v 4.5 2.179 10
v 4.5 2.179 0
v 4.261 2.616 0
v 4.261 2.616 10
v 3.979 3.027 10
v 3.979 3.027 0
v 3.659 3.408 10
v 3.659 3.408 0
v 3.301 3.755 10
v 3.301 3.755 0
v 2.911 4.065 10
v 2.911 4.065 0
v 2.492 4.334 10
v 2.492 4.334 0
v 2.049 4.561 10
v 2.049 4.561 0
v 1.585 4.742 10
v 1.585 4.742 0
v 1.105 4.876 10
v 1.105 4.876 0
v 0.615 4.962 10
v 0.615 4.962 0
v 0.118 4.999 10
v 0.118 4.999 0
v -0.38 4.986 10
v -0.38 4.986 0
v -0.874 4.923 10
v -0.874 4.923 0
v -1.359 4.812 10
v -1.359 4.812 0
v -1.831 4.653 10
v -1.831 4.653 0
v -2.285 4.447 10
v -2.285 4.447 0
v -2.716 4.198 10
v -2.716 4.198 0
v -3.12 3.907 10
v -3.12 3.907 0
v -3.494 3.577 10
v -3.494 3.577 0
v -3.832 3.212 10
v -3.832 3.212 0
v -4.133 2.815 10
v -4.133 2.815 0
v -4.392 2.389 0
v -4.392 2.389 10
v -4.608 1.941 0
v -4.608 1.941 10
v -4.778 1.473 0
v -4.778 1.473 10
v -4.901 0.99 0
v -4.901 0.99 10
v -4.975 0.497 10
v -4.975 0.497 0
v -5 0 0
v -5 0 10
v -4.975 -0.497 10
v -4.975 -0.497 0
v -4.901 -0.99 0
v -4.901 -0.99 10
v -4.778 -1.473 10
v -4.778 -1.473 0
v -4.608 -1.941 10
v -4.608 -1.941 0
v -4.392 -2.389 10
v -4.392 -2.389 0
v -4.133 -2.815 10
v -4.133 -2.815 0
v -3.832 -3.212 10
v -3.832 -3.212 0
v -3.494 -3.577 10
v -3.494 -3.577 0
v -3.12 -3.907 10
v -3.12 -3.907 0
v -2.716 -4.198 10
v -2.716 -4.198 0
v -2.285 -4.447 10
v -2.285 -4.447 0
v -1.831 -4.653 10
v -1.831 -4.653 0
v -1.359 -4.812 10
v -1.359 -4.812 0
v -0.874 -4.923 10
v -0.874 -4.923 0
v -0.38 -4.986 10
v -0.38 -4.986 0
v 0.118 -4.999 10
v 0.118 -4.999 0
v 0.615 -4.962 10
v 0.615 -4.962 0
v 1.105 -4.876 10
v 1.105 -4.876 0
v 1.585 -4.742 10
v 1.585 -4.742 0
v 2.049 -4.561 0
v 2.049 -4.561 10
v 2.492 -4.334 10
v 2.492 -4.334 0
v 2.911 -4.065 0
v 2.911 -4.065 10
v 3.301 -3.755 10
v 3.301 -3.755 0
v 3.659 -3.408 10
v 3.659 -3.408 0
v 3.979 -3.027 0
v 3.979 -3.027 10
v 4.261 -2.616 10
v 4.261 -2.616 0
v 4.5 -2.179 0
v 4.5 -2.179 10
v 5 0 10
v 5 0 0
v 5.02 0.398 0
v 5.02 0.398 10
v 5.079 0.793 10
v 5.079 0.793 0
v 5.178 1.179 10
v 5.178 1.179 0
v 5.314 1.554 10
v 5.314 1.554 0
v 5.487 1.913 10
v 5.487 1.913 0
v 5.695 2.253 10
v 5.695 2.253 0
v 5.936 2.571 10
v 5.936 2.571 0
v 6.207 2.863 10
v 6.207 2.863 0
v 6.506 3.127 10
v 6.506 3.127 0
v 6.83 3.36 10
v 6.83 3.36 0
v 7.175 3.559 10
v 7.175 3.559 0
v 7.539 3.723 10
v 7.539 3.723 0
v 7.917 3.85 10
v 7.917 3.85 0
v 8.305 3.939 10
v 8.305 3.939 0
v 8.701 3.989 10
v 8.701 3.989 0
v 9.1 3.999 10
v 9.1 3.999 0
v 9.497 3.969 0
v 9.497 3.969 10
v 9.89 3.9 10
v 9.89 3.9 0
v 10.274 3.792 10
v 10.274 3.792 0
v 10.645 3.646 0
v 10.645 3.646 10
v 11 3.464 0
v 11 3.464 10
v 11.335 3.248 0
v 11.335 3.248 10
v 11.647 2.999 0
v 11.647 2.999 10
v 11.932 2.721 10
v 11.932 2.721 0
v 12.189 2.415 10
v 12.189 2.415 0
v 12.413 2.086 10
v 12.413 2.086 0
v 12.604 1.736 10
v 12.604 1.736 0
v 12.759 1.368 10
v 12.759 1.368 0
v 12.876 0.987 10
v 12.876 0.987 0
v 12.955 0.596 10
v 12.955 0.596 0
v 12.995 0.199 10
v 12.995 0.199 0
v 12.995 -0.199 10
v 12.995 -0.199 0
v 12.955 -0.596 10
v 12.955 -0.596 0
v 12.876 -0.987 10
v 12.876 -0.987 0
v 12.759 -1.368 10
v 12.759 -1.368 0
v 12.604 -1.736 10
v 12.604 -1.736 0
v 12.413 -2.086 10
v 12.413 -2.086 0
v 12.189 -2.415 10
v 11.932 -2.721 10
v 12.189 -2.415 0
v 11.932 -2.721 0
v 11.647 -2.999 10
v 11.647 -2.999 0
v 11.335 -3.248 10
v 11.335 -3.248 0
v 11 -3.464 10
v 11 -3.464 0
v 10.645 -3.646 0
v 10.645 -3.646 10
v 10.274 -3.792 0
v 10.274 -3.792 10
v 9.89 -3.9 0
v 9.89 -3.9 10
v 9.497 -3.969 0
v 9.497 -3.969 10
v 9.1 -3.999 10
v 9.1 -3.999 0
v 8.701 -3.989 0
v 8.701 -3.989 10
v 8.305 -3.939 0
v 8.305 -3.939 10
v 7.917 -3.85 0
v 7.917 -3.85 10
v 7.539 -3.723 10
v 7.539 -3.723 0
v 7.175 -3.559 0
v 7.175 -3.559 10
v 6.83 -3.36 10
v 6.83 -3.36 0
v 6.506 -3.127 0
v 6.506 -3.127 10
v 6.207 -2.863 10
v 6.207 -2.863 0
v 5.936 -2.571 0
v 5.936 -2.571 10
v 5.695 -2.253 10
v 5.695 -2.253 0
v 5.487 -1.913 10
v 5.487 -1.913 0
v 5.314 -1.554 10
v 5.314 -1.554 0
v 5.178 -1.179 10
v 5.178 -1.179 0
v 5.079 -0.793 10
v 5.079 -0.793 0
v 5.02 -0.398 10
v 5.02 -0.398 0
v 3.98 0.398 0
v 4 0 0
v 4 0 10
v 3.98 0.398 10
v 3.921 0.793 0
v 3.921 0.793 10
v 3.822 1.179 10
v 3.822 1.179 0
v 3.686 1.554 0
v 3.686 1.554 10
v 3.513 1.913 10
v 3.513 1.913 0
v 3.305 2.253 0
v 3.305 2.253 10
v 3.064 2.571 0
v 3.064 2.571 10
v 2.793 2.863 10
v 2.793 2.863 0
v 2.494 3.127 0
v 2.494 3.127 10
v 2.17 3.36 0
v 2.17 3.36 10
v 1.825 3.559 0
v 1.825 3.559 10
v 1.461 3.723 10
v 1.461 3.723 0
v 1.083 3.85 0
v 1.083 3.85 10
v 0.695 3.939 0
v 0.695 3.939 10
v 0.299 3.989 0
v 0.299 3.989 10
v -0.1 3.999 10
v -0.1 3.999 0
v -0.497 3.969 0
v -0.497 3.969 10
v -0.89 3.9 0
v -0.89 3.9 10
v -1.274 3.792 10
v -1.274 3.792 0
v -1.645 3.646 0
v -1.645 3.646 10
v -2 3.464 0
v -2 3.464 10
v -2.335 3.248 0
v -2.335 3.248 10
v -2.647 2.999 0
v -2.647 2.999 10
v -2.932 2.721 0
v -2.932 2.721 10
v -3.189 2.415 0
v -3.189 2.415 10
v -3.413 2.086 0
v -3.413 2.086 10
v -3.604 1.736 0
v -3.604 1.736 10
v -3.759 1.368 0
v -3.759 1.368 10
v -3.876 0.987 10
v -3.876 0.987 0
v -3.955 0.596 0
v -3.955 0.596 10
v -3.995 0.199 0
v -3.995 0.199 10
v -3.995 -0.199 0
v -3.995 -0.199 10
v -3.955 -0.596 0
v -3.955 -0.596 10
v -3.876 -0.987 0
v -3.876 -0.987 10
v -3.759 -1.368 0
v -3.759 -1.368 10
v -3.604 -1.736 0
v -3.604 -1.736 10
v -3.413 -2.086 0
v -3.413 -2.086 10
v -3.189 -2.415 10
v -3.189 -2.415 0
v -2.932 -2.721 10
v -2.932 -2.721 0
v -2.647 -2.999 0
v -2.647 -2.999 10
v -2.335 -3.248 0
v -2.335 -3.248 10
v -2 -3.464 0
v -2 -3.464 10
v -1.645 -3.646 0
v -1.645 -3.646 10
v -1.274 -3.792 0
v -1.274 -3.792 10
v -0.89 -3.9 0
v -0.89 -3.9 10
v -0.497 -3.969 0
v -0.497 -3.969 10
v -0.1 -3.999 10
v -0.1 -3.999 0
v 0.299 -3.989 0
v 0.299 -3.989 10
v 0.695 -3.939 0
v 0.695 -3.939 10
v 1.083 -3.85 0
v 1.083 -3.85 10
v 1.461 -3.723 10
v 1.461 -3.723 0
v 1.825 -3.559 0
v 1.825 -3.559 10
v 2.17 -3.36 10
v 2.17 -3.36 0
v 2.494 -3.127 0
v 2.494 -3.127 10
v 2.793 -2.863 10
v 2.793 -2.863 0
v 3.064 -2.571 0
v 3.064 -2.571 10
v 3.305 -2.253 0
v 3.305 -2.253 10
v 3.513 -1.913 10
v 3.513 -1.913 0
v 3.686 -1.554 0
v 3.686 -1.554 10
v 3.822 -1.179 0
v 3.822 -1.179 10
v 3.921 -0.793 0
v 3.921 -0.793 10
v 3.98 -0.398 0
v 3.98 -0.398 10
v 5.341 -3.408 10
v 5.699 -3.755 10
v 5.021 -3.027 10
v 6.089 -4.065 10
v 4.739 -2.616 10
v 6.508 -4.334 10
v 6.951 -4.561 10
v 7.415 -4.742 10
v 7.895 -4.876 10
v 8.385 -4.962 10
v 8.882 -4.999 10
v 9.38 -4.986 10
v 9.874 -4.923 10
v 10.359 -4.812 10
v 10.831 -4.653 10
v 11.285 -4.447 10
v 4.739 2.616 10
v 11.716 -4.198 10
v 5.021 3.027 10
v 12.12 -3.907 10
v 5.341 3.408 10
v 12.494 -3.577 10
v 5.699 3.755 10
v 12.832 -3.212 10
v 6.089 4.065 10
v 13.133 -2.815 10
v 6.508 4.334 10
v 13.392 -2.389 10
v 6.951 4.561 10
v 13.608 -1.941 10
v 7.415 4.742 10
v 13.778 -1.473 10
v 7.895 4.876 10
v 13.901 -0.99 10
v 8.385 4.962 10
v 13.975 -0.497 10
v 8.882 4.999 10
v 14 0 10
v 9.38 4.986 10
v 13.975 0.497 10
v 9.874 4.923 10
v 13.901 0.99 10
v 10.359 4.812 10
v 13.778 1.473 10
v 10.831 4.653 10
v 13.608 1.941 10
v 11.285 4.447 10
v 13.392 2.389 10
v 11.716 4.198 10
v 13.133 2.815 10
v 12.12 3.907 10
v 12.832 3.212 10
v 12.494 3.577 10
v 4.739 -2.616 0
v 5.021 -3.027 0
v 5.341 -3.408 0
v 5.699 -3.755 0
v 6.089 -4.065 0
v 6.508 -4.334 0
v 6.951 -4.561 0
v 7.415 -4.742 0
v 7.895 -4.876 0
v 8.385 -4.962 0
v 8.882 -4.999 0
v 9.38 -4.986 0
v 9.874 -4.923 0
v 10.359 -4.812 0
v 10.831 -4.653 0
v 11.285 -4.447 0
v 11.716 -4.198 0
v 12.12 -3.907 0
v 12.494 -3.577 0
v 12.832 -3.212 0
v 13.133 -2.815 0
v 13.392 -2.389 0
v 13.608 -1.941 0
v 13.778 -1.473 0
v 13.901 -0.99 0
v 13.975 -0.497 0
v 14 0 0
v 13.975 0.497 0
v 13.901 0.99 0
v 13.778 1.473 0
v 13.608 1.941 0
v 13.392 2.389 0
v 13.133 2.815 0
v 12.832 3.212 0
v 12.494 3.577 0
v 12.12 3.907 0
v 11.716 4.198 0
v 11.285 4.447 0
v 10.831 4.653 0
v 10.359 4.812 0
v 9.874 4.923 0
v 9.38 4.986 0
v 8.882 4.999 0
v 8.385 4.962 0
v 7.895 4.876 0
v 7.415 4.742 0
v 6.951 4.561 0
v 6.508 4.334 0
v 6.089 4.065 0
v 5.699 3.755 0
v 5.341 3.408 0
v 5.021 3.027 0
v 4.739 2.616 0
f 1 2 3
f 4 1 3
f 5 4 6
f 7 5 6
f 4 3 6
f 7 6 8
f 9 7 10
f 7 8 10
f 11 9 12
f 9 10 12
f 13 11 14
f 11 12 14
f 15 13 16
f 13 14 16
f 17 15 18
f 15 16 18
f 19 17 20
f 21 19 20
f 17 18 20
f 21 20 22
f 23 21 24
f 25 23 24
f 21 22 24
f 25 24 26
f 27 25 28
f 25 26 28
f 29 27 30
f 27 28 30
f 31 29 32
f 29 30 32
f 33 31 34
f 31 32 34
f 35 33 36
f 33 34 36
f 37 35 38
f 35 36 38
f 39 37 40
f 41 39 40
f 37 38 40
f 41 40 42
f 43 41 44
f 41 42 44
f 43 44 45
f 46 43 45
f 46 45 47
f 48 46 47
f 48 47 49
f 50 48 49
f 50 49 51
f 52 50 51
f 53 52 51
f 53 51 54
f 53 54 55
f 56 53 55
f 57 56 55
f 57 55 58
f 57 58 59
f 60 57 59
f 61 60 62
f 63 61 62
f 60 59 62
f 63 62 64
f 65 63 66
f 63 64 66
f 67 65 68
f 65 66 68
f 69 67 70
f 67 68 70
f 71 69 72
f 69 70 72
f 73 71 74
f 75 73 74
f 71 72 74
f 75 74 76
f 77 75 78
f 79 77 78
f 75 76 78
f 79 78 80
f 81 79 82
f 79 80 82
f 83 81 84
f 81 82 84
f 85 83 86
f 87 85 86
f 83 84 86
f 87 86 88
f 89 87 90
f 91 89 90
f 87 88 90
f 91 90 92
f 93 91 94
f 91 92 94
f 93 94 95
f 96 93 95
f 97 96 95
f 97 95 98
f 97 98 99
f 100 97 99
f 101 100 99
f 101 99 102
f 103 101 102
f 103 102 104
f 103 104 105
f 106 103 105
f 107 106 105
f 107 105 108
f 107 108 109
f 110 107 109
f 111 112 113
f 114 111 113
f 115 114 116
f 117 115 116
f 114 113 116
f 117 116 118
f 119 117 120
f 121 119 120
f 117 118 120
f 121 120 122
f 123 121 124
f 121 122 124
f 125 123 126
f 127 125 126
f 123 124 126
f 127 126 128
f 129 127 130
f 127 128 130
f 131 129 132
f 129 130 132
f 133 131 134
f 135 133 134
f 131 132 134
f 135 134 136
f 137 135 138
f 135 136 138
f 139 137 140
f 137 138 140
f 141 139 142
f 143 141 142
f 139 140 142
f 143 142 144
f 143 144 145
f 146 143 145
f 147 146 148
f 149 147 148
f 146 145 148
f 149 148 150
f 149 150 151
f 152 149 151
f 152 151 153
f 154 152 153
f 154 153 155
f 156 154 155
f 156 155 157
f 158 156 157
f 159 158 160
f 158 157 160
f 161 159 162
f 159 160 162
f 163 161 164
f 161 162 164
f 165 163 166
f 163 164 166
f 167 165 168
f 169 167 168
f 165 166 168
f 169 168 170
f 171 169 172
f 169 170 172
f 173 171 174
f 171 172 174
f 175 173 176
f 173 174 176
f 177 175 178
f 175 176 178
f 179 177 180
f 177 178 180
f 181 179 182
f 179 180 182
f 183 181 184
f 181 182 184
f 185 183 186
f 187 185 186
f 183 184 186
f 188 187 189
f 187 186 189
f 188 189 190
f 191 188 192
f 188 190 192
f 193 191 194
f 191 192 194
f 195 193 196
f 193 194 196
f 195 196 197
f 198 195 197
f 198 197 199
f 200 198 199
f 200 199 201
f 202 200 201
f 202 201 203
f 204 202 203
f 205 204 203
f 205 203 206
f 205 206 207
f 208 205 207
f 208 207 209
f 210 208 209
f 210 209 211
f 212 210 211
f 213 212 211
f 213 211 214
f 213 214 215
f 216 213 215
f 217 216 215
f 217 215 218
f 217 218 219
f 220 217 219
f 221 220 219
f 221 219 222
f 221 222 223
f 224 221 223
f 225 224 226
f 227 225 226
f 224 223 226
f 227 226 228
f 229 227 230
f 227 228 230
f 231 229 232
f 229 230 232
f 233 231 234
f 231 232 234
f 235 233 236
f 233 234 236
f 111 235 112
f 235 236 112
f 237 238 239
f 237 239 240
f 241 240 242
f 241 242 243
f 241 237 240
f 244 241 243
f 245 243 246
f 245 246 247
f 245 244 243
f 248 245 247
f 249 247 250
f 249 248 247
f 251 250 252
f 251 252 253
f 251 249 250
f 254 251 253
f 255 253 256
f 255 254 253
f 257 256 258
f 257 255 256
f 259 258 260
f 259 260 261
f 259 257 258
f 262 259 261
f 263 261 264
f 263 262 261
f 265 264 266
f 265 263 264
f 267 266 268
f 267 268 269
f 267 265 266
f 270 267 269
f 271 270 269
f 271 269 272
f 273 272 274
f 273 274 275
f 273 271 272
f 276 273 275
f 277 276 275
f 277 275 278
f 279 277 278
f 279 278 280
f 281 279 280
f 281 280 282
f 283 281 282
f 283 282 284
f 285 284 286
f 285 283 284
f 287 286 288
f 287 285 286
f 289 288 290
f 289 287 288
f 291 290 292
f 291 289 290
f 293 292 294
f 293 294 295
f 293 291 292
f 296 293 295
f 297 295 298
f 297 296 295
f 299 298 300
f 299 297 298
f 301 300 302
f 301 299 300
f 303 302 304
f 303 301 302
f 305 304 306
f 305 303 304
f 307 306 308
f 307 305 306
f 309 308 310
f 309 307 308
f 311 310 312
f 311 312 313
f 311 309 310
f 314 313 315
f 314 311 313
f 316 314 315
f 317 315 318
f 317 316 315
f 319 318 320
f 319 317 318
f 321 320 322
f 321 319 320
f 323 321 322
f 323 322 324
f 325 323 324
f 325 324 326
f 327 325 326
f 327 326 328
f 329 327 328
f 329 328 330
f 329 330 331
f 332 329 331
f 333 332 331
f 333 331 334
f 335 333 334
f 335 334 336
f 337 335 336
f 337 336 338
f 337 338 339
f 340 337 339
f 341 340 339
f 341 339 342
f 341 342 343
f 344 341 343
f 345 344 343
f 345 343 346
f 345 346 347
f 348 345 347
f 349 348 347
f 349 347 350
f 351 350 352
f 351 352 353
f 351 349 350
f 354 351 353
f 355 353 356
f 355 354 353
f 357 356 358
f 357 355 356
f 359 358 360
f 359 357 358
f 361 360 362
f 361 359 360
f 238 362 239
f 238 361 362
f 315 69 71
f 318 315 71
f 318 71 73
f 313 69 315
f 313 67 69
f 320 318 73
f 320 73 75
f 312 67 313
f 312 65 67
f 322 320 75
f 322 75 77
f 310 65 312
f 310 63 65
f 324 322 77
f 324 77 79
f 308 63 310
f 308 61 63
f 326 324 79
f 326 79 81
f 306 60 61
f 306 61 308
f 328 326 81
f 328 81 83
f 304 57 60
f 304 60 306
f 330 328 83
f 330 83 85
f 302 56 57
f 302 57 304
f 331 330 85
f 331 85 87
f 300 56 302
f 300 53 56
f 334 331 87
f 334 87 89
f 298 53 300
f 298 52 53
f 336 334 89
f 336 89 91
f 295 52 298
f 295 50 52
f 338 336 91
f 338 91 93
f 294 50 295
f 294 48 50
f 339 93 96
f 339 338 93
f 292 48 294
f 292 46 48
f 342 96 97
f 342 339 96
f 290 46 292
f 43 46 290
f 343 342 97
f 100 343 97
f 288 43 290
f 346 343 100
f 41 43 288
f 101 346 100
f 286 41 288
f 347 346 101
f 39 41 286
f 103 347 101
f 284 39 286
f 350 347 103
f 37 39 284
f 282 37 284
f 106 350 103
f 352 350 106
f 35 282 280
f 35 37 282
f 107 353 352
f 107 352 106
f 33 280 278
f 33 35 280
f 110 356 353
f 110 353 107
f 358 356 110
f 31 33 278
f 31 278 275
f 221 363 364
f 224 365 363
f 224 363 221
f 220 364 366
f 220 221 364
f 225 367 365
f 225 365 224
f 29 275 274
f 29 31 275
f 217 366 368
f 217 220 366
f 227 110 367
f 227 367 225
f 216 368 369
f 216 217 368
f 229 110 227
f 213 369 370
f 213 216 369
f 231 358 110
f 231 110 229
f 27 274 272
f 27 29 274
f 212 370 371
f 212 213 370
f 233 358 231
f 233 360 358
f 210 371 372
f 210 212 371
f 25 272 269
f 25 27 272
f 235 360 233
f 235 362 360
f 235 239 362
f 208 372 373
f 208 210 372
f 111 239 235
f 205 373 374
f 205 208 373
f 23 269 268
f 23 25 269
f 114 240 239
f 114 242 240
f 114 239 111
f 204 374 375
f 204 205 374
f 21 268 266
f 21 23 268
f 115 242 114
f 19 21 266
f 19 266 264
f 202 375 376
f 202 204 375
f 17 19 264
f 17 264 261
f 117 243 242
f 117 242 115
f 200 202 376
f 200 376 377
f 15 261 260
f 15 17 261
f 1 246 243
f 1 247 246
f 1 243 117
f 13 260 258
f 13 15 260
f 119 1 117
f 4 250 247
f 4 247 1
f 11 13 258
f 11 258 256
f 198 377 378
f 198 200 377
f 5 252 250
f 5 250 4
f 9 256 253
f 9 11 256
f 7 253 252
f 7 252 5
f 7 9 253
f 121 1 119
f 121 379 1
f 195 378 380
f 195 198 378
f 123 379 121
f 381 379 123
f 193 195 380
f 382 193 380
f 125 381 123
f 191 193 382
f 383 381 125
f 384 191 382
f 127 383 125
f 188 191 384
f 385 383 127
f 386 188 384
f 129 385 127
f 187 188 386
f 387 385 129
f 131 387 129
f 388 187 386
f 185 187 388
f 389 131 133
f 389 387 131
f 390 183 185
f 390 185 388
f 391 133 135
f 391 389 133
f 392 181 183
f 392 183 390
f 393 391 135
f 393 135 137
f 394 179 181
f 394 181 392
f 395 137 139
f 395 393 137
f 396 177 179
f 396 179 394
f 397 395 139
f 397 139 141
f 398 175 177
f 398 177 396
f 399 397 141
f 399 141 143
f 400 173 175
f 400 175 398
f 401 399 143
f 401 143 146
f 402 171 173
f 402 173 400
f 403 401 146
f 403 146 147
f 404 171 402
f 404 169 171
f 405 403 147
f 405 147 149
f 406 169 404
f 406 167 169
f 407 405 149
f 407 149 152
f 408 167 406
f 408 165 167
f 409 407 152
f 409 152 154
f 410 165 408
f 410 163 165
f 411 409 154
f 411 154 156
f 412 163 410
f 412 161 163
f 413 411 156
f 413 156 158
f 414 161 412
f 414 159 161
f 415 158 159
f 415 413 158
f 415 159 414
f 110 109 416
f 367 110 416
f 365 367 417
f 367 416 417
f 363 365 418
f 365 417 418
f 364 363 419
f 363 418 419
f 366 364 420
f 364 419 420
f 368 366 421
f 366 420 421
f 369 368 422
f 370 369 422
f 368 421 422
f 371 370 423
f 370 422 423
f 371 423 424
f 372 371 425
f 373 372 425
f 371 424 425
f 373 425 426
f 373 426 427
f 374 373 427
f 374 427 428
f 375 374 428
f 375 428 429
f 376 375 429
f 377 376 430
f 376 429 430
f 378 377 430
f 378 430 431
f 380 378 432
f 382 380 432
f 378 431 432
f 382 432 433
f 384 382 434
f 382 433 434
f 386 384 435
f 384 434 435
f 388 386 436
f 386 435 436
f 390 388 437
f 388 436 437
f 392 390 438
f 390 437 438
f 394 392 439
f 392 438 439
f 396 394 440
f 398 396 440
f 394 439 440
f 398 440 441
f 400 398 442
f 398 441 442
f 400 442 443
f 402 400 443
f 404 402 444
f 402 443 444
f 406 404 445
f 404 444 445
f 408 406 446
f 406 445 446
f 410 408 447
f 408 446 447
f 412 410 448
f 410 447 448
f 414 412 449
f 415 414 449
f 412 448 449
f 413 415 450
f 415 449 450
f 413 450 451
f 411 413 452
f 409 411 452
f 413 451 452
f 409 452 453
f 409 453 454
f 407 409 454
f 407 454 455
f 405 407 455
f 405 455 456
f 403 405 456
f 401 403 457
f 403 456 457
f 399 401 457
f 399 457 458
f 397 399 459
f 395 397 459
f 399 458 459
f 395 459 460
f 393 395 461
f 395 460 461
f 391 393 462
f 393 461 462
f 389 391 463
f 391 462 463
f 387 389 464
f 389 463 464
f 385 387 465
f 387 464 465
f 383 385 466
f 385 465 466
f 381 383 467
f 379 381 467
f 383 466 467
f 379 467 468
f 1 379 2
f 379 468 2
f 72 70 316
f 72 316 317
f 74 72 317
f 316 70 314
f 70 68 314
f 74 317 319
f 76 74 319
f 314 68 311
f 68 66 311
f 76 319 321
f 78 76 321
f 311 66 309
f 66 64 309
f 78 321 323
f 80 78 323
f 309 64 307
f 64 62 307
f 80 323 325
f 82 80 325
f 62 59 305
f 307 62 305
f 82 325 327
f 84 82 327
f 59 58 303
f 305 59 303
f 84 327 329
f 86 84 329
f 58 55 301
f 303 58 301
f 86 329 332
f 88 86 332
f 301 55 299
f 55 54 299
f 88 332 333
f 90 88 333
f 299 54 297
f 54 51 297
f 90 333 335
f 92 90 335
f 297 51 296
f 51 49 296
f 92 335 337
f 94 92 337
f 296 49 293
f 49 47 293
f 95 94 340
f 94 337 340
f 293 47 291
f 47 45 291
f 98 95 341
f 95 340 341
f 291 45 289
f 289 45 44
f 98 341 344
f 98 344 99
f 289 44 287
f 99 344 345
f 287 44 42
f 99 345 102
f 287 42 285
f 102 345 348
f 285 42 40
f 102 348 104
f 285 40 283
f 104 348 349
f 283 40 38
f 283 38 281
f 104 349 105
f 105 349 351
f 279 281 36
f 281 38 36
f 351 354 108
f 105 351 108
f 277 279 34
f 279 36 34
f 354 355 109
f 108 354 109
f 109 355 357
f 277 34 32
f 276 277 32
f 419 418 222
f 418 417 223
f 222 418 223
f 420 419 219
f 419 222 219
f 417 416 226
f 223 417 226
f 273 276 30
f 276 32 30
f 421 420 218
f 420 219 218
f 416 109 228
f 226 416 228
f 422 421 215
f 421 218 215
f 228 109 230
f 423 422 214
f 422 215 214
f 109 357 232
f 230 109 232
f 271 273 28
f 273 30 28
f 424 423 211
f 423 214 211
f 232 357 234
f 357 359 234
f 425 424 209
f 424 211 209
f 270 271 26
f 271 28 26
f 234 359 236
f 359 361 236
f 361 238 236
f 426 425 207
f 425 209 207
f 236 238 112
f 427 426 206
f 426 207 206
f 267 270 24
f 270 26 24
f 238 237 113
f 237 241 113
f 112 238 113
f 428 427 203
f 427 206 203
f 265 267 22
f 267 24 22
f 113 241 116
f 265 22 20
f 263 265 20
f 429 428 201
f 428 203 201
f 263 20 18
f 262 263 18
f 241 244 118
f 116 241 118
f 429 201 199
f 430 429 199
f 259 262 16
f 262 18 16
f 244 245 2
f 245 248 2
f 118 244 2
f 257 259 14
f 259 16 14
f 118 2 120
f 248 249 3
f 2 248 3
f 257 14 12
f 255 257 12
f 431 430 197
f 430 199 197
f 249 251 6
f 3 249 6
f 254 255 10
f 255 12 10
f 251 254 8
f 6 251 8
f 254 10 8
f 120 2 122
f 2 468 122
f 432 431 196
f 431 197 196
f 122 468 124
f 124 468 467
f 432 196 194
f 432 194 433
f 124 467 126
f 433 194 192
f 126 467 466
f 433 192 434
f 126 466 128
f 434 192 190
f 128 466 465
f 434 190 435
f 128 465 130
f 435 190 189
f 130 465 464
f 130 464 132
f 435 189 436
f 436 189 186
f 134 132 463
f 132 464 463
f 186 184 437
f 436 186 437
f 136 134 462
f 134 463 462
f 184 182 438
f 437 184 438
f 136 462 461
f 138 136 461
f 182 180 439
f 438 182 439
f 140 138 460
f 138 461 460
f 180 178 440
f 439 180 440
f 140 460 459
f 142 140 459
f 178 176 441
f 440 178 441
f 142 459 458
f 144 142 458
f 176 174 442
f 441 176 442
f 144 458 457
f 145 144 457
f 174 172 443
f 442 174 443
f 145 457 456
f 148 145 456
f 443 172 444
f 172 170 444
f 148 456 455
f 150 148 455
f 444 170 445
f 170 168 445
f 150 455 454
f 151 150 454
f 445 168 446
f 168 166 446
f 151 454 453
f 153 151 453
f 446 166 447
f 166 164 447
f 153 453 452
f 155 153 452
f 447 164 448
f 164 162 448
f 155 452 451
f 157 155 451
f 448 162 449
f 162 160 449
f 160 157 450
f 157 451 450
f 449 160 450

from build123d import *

# Parameters (mm, degrees)
F0_R     = 4
F1_DEPTH = 10


with BuildPart() as f1:
    # F0 (on Top) → F1 (new body)
    with BuildSketch(Plane.XY):
        with BuildLine():
            ThreePointArc((4.5, -2.1794494718), (4.8733971724, -1.1180339887), (5, 0))
            ThreePointArc((5, 0), (4.8733971724, 1.1180339887), (4.5, 2.1794494718))
            ThreePointArc((4.5, 2.1794494718), (4.1266028276, 1.1180339887), (4, 0))
            ThreePointArc((4, 0), (4.1266028276, -1.1180339887), (4.5, -2.1794494718))
        make_face()
        with BuildLine():
            ThreePointArc((4.5, 2.1794494718), (4.8733971724, 1.1180339887), (5, 0))
            ThreePointArc((5, 0), (4.8733971724, -1.1180339887), (4.5, -2.1794494718))
            ThreePointArc((4.5, -2.1794494718), (10.1180339887, -4.8733971724), (14, 0))
            ThreePointArc((14, 0), (10.1180339887, 4.8733971724), (4.5, 2.1794494718))
        make_face()
        with BuildLine():
            ThreePointArc((13, 0), (9, -4), (5, 0))
            ThreePointArc((5, 0), (9, 4), (13, 0))
        make_face(mode=Mode.SUBTRACT)
        with BuildLine():
            ThreePointArc((4, 0), (4.1266028276, 1.1180339887), (4.5, 2.1794494718))
            ThreePointArc((4.5, 2.1794494718), (-5, 0), (4.5, -2.1794494718))
            ThreePointArc((4.5, -2.1794494718), (4.1266028276, -1.1180339887), (4, 0))
        make_face()
        Circle(F0_R, mode=Mode.SUBTRACT)
    extrude(amount=F1_DEPTH)


solid = f1.part
